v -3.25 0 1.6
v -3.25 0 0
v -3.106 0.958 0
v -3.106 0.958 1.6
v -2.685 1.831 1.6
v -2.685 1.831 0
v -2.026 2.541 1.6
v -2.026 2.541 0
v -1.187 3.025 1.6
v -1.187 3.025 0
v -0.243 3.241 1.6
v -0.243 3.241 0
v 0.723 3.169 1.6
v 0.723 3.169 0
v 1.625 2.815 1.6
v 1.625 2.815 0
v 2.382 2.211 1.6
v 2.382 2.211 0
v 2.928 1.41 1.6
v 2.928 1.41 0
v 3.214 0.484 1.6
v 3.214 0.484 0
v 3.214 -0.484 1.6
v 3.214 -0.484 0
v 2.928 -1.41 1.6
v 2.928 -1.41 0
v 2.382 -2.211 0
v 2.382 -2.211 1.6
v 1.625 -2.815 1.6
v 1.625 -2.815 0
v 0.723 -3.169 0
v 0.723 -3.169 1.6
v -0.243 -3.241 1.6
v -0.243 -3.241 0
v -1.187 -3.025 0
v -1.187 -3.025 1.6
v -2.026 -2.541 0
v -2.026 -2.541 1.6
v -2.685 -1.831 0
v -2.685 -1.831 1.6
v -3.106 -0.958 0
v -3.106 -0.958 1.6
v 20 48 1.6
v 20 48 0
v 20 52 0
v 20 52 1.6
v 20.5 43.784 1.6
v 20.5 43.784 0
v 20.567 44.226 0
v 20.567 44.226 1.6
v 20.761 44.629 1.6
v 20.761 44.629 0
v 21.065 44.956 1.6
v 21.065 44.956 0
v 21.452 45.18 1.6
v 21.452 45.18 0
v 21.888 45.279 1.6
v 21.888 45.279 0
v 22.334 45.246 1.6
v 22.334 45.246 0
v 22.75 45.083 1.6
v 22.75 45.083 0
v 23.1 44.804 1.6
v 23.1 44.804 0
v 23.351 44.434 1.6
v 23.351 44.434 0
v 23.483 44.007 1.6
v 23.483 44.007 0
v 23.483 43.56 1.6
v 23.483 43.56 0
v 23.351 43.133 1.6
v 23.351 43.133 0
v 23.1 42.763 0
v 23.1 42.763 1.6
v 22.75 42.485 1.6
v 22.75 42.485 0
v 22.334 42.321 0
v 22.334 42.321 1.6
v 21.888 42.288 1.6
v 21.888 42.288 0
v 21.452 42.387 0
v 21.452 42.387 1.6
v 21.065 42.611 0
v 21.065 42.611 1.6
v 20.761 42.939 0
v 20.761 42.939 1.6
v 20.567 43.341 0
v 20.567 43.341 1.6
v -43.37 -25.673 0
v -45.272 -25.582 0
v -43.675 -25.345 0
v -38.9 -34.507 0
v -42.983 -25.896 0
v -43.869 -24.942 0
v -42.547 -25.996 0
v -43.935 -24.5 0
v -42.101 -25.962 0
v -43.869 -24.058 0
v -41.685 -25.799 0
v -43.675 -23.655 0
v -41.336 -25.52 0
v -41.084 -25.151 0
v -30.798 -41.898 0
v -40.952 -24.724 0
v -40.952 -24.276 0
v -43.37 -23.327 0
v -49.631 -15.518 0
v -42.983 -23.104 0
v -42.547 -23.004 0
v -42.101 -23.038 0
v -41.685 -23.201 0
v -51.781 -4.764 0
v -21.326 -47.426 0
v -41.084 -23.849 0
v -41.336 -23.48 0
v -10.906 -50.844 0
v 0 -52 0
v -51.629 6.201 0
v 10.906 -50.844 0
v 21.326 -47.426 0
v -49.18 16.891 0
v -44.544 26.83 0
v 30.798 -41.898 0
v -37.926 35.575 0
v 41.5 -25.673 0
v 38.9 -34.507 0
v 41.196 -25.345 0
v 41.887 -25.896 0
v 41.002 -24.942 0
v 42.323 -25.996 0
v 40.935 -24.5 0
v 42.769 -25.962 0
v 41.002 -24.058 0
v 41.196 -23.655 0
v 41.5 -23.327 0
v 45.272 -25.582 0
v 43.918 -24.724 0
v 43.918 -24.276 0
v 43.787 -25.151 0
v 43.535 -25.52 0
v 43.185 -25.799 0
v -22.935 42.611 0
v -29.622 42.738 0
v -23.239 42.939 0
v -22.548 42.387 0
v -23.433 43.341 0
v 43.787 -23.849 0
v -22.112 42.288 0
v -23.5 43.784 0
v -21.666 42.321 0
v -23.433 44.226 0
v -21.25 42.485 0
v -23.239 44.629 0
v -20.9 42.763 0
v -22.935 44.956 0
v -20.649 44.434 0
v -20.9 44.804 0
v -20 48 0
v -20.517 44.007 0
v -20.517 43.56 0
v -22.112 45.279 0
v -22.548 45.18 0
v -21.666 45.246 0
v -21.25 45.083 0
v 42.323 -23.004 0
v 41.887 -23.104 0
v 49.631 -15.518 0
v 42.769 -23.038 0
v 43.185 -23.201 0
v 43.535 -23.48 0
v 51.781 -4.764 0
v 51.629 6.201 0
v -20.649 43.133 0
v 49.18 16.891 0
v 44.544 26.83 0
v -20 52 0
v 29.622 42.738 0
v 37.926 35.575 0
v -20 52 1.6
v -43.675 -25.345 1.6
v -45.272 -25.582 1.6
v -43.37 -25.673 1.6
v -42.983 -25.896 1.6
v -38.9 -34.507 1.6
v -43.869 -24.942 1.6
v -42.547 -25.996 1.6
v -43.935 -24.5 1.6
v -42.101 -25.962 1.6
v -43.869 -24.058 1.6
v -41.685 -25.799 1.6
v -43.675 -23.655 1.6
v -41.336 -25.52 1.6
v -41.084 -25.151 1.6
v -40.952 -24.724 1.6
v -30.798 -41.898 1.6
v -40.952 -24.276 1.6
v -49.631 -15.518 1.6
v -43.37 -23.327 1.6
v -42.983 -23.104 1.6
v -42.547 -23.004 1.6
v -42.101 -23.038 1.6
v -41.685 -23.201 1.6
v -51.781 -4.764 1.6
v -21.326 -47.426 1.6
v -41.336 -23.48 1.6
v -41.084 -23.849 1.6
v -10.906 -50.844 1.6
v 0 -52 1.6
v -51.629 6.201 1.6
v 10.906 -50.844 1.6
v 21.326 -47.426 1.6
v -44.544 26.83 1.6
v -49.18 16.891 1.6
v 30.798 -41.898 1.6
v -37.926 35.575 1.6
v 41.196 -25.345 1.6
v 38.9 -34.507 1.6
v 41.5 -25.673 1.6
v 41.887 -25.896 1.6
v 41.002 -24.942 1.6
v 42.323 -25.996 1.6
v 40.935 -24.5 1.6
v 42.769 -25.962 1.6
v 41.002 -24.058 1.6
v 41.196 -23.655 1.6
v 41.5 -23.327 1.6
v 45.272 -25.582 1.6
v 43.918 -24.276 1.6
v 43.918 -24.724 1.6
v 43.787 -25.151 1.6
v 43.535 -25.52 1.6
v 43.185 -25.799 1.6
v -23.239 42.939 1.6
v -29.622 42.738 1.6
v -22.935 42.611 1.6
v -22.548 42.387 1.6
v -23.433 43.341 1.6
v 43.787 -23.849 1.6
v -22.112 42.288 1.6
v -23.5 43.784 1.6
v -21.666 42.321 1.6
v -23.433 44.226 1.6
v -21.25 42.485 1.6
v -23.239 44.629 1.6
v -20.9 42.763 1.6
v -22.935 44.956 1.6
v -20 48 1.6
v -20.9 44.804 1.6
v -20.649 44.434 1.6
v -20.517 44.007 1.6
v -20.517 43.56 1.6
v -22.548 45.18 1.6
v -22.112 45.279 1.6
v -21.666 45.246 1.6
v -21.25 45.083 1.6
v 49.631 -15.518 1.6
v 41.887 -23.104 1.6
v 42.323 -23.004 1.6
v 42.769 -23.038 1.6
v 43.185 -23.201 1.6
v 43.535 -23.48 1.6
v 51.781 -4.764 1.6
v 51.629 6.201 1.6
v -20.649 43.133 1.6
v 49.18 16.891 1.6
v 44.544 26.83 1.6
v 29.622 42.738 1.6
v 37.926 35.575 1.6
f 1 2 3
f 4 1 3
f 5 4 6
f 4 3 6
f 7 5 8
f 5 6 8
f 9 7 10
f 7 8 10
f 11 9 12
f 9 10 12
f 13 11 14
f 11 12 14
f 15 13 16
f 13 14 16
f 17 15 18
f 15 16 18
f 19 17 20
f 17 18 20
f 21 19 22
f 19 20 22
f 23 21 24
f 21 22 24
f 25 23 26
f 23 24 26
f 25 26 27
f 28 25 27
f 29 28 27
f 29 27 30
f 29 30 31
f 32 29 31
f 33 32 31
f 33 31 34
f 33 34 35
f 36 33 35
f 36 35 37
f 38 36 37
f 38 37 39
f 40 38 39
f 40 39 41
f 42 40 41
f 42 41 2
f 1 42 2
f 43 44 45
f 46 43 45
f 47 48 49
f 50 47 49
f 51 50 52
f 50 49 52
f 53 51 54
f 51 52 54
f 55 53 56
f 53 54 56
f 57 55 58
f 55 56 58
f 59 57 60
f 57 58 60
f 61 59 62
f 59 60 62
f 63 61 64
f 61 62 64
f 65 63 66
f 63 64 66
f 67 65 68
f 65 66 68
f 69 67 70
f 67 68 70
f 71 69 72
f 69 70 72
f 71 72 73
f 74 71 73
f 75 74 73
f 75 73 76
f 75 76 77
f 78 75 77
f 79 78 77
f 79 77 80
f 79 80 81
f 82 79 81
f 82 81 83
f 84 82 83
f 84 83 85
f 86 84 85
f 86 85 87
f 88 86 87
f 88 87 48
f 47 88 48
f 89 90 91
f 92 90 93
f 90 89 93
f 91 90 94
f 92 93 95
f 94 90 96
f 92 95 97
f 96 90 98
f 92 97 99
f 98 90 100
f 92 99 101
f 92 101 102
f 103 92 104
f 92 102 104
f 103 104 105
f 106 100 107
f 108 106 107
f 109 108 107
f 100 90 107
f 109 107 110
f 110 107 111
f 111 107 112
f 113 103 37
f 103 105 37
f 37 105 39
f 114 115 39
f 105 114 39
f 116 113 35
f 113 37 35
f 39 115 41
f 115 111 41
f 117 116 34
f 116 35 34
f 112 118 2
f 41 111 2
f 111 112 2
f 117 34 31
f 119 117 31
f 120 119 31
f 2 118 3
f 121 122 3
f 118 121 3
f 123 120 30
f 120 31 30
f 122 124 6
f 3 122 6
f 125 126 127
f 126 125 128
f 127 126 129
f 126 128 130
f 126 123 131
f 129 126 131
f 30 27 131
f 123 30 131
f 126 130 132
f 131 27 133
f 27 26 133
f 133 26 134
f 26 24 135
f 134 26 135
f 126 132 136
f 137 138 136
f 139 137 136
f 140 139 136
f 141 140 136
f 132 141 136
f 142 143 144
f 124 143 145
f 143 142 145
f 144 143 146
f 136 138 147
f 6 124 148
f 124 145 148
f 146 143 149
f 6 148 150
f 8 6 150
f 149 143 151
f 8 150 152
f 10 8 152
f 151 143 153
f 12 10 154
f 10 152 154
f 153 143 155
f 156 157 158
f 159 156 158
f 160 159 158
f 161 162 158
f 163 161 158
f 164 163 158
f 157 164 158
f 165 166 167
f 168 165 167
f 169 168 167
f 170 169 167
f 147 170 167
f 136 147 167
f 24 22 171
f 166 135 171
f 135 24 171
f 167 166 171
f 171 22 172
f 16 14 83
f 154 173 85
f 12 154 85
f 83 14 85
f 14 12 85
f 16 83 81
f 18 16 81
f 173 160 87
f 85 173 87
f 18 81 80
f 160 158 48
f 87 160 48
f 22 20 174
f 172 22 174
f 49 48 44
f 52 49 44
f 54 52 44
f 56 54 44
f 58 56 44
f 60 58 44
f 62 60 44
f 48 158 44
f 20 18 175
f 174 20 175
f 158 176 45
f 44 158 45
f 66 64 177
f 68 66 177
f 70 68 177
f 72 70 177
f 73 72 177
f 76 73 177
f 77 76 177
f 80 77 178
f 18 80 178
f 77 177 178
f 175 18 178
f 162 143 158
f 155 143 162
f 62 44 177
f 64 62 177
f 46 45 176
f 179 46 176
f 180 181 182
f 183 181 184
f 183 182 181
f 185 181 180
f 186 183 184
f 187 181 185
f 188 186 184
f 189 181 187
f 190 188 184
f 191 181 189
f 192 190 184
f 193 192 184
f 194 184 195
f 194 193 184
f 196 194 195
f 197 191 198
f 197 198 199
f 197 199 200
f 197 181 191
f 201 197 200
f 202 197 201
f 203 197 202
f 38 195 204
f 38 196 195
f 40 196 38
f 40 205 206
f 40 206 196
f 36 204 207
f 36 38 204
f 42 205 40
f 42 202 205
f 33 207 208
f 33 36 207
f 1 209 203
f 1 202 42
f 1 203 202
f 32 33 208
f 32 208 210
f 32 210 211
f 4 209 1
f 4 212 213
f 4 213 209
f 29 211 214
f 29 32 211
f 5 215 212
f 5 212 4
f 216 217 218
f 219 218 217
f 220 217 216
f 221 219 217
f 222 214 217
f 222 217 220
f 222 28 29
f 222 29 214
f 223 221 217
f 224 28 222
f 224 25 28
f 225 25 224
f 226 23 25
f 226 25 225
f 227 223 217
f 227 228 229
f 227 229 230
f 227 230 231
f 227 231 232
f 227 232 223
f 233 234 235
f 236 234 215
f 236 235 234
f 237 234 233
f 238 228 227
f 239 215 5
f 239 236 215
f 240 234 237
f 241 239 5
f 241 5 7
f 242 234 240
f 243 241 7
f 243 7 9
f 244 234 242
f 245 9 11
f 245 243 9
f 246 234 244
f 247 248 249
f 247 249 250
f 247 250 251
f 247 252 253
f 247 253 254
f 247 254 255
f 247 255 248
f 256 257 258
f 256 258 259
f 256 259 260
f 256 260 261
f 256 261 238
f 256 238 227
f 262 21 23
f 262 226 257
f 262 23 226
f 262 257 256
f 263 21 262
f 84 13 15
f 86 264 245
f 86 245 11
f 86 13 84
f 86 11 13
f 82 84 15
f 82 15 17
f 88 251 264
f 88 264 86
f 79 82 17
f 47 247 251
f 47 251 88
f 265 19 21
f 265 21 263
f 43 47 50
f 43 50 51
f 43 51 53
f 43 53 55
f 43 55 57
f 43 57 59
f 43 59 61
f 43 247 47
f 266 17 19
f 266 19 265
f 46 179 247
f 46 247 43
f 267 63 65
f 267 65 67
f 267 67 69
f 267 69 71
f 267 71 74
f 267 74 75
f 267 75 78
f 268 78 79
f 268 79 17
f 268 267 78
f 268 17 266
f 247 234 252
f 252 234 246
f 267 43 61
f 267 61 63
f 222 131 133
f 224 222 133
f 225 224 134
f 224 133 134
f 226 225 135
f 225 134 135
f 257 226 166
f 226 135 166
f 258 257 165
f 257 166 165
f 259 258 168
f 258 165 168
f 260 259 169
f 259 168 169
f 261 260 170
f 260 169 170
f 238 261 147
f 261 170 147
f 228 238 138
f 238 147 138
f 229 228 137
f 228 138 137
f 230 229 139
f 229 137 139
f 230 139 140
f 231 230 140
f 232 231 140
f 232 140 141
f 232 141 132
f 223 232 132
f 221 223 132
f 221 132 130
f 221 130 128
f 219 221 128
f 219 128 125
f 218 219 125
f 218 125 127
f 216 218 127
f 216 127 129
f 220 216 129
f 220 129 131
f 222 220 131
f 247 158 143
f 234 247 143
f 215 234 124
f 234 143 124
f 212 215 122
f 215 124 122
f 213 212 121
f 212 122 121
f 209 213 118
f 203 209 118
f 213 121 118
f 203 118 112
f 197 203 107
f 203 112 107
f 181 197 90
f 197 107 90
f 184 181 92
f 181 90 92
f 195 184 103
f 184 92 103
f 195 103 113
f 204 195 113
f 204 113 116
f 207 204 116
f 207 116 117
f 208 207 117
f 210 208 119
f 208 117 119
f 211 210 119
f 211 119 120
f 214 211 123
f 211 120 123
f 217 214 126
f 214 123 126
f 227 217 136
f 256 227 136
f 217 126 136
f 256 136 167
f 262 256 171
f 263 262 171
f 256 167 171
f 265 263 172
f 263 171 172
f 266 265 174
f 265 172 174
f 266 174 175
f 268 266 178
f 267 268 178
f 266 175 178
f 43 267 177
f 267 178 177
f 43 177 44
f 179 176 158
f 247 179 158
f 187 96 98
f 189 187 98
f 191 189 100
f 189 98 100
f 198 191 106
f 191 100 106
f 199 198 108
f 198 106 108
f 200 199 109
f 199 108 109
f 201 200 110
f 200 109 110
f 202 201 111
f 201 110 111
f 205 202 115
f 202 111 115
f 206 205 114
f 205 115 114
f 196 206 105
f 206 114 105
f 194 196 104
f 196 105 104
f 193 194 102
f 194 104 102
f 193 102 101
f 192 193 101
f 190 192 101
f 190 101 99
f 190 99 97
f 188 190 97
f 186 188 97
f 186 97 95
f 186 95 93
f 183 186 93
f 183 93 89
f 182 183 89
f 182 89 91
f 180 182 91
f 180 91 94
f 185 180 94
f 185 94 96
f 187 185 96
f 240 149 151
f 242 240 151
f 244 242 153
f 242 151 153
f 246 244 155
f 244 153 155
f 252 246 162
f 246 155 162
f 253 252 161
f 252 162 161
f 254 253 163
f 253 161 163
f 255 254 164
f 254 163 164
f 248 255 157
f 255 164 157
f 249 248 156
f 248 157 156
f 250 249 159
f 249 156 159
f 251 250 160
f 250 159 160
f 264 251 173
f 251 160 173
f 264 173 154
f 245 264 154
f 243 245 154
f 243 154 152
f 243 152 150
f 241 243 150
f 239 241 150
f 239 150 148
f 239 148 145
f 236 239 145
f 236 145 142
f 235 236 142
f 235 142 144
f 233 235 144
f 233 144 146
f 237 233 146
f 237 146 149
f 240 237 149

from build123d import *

# Parameters (mm, degrees)
F1_DEPTH = 1.6
F3_D     = 3
F5_D     = 6.5


with BuildPart() as f1:
    # F0 (on Top) → F1 (new body)
    with BuildSketch(Plane.XY):
        with BuildLine():
            Line((-20, 52), (-20, 48))
            ThreePointArc((-20, 48), (0, -52), (20, 48))
            Line((20, 48), (20, 52))
            Line((20, 52), (-20, 52))
        make_face()
    extrude(amount=F1_DEPTH)

    # F3 (through all)
    with Locations(Plane.XY.offset(1.6)):
        with Locations((-22, 43.783559), (22, 43.783559), (42.435245, -24.5), (-42.435245, -24.5)):
            Hole(F3_D / 2)

    # F5 (through all)
    with Locations(Plane.XY.offset(1.6)):
        with Locations((0, 0)):
            Hole(F5_D / 2)


solid = f1.part
